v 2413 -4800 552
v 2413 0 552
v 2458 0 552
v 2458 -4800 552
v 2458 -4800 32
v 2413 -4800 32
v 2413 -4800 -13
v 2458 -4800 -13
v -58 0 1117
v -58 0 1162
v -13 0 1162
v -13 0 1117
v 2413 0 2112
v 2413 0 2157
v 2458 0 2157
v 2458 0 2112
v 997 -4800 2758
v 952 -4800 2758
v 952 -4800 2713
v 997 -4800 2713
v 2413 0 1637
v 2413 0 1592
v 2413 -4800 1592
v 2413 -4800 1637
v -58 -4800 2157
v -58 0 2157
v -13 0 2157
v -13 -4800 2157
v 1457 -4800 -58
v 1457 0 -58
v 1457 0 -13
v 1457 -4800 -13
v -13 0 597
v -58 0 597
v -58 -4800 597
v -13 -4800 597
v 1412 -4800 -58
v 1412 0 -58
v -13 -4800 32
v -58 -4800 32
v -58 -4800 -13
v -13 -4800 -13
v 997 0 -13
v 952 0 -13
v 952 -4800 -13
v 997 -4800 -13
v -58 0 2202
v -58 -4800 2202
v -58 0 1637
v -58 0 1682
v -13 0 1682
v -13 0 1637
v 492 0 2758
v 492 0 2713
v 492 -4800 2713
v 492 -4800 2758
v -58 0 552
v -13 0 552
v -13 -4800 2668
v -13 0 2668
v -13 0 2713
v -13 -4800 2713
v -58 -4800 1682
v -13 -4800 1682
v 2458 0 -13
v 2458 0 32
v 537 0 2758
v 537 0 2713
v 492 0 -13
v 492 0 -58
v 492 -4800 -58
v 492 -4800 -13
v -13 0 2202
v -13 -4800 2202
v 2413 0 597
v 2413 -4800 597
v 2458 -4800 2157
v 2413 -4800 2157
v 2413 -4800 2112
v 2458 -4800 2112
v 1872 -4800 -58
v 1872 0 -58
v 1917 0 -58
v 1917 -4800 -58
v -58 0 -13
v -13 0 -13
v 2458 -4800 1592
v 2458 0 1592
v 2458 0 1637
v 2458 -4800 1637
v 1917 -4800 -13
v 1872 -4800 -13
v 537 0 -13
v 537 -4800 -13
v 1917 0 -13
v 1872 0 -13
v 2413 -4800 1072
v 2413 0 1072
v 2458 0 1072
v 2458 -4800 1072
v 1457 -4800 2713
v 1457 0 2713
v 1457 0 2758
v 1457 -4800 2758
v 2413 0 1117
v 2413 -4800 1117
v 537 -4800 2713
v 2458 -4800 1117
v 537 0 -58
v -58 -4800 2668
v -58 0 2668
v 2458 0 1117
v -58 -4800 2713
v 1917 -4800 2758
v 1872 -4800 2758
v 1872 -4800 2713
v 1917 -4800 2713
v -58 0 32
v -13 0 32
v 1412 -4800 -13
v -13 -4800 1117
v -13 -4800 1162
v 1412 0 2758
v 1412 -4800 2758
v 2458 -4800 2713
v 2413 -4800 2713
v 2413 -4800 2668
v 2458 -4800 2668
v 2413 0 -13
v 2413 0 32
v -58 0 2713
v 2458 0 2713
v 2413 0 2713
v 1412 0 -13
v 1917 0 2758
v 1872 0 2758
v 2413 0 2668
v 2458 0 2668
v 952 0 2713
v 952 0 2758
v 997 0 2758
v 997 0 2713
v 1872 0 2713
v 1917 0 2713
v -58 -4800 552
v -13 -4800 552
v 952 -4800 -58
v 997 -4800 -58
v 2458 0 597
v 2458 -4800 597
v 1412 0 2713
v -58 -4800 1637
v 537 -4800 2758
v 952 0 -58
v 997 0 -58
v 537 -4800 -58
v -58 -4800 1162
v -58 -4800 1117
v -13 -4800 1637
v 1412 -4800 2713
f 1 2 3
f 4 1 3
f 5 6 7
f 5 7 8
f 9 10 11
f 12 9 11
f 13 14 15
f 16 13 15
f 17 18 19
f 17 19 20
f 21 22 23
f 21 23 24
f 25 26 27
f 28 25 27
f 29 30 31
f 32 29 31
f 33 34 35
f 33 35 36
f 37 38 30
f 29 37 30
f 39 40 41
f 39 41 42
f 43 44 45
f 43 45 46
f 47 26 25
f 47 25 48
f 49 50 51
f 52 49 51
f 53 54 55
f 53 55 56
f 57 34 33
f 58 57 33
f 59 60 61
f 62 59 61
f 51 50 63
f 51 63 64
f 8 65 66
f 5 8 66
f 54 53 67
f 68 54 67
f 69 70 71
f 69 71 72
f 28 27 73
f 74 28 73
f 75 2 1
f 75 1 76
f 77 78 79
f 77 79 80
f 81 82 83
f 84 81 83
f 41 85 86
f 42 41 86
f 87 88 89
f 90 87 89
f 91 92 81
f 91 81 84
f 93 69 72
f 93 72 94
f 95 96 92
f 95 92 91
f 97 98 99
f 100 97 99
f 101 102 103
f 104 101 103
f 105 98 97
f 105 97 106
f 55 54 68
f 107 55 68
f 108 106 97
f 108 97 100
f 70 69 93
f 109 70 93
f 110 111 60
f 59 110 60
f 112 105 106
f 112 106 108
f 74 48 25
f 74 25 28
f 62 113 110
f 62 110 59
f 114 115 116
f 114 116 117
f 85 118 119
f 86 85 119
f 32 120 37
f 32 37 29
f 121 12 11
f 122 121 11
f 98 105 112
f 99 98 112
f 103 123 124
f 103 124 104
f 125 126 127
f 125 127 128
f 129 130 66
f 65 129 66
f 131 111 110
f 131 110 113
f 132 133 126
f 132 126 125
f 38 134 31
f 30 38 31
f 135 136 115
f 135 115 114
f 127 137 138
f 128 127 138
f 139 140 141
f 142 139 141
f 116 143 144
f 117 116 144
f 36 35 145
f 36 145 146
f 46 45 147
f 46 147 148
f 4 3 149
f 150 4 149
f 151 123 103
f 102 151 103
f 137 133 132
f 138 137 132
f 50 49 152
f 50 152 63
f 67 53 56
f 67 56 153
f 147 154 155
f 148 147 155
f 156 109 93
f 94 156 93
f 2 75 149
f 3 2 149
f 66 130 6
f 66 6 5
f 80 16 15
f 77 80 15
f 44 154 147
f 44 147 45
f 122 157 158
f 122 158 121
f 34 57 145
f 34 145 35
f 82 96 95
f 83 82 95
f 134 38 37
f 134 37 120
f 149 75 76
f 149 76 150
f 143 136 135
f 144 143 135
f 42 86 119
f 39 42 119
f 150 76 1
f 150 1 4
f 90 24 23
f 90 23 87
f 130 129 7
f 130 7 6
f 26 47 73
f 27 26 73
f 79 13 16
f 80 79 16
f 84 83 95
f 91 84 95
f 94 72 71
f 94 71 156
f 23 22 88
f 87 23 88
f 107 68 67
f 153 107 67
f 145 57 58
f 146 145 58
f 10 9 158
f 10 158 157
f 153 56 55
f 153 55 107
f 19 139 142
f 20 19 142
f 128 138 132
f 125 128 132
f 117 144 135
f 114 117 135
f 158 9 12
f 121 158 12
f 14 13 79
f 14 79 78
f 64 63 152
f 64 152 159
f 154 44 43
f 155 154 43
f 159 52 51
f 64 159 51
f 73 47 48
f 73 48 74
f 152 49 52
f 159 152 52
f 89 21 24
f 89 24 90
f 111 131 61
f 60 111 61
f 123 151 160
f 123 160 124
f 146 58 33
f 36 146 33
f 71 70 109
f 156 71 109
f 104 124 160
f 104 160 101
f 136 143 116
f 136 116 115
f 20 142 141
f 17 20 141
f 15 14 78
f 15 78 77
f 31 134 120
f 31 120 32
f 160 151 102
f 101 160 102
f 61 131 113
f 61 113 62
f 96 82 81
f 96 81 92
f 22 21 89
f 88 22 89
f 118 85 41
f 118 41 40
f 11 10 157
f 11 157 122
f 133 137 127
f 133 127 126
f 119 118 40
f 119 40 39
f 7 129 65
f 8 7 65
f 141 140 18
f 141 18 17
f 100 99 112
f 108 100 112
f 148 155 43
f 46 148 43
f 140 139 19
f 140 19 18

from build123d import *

# Parameters (mm, degrees)
F0_W     = 45
F0_H     = 45
F2_DEPTH = 4800


# Not quite as in the source:
# - a feature of the source that left no trace in its solid (it failed there, or was rolled back) is left out


with BuildPart() as f2:
    # F0 (on Front) → F2 (new body)
    with BuildSketch(Plane.XZ):
        with Locations((-35.5, 2690.5)):
            Rectangle(F0_W, F0_H)
    extrude(amount=F2_DEPTH)


with BuildPart() as f2b:
    # F0 (on Front) → F2, piece 2 (new body)
    with BuildSketch(Plane.XZ):
        with Locations((2435.5, 2690.5)):
            Rectangle(F0_W, F0_H)
    extrude(amount=F2_DEPTH)


with BuildPart() as f2c:
    # F0 (on Front) → F2, piece 3 (new body)
    with BuildSketch(Plane.XZ):
        with Locations((514.5, 2735.5)):
            Rectangle(F0_W, F0_H)
    extrude(amount=F2_DEPTH)


with BuildPart() as f2d:
    # F0 (on Front) → F2, piece 4 (new body)
    with BuildSketch(Plane.XZ):
        with Locations((974.5, 2735.5)):
            Rectangle(F0_W, F0_H)
    extrude(amount=F2_DEPTH)


with BuildPart() as f2e:
    # F0 (on Front) → F2, piece 5 (new body)
    with BuildSketch(Plane.XZ):
        with Locations((1434.5, 2735.5)):
            Rectangle(F0_W, F0_H)
    extrude(amount=F2_DEPTH)


with BuildPart() as f2f:
    # F0 (on Front) → F2, piece 6 (new body)
    with BuildSketch(Plane.XZ):
        with Locations((1894.5, 2735.5)):
            Rectangle(F0_W, F0_H)
    extrude(amount=F2_DEPTH)


with BuildPart() as f2g:
    # F0 (on Front) → F2, piece 7 (new body)
    with BuildSketch(Plane.XZ):
        with Locations((-35.5, 2179.5)):
            Rectangle(F0_W, F0_H)
    extrude(amount=F2_DEPTH)


with BuildPart() as f2h:
    # F0 (on Front) → F2, piece 8 (new body)
    with BuildSketch(Plane.XZ):
        with Locations((-35.5, 1659.5)):
            Rectangle(F0_W, F0_H)
    extrude(amount=F2_DEPTH)


with BuildPart() as f2i:
    # F0 (on Front) → F2, piece 9 (new body)
    with BuildSketch(Plane.XZ):
        with Locations((-35.5, 1139.5)):
            Rectangle(F0_W, F0_H)
    extrude(amount=F2_DEPTH)


with BuildPart() as f2j:
    # F0 (on Front) → F2, piece 10 (new body)
    with BuildSketch(Plane.XZ):
        with Locations((-35.5, 574.5)):
            Rectangle(F0_W, F0_H)
    extrude(amount=F2_DEPTH)


with BuildPart() as f2k:
    # F0 (on Front) → F2, piece 11 (new body)
    with BuildSketch(Plane.XZ):
        with Locations((-35.5, 9.5)):
            Rectangle(F0_W, F0_H)
    extrude(amount=F2_DEPTH)


with BuildPart() as f2l:
    # F0 (on Front) → F2, piece 12 (new body)
    with BuildSketch(Plane.XZ):
        with Locations((2435.5, 9.5)):
            Rectangle(F0_W, F0_H)
    extrude(amount=F2_DEPTH)


with BuildPart() as f2m:
    # F0 (on Front) → F2, piece 13 (new body)
    with BuildSketch(Plane.XZ):
        with Locations((2435.5, 574.5)):
            Rectangle(F0_W, F0_H)
    extrude(amount=F2_DEPTH)


with BuildPart() as f2n:
    # F0 (on Front) → F2, piece 14 (new body)
    with BuildSketch(Plane.XZ):
        with Locations((2435.5, 1094.5)):
            Rectangle(F0_W, F0_H)
    extrude(amount=F2_DEPTH)


with BuildPart() as f2o:
    # F0 (on Front) → F2, piece 15 (new body)
    with BuildSketch(Plane.XZ):
        with Locations((2435.5, 1614.5)):
            Rectangle(F0_W, F0_H)
    extrude(amount=F2_DEPTH)


with BuildPart() as f2p:
    # F0 (on Front) → F2, piece 16 (new body)
    with BuildSketch(Plane.XZ):
        with Locations((2435.5, 2134.5)):
            Rectangle(F0_W, F0_H)
    extrude(amount=F2_DEPTH)


with BuildPart() as f2q:
    # F0 (on Front) → F2, piece 17 (new body)
    with BuildSketch(Plane.XZ):
        with Locations((514.5, -35.5)):
            Rectangle(F0_W, F0_H)
    extrude(amount=F2_DEPTH)


with BuildPart() as f2r:
    # F0 (on Front) → F2, piece 18 (new body)
    with BuildSketch(Plane.XZ):
        with Locations((974.5, -35.5)):
            Rectangle(F0_W, F0_H)
    extrude(amount=F2_DEPTH)


with BuildPart() as f2s:
    # F0 (on Front) → F2, piece 19 (new body)
    with BuildSketch(Plane.XZ):
        with Locations((1434.5, -35.5)):
            Rectangle(F0_W, F0_H)
    extrude(amount=F2_DEPTH)


with BuildPart() as f2t:
    # F0 (on Front) → F2, piece 20 (new body)
    with BuildSketch(Plane.XZ):
        with Locations((1894.5, -35.5)):
            Rectangle(F0_W, F0_H)
    extrude(amount=F2_DEPTH)


solid = Compound([f2.part, f2b.part, f2c.part, f2d.part, f2e.part, f2f.part, f2g.part, f2h.part, f2i.part, f2j.part, f2k.part, f2l.part, f2m.part, f2n.part, f2o.part, f2p.part, f2q.part, f2r.part, f2s.part, f2t.part])
